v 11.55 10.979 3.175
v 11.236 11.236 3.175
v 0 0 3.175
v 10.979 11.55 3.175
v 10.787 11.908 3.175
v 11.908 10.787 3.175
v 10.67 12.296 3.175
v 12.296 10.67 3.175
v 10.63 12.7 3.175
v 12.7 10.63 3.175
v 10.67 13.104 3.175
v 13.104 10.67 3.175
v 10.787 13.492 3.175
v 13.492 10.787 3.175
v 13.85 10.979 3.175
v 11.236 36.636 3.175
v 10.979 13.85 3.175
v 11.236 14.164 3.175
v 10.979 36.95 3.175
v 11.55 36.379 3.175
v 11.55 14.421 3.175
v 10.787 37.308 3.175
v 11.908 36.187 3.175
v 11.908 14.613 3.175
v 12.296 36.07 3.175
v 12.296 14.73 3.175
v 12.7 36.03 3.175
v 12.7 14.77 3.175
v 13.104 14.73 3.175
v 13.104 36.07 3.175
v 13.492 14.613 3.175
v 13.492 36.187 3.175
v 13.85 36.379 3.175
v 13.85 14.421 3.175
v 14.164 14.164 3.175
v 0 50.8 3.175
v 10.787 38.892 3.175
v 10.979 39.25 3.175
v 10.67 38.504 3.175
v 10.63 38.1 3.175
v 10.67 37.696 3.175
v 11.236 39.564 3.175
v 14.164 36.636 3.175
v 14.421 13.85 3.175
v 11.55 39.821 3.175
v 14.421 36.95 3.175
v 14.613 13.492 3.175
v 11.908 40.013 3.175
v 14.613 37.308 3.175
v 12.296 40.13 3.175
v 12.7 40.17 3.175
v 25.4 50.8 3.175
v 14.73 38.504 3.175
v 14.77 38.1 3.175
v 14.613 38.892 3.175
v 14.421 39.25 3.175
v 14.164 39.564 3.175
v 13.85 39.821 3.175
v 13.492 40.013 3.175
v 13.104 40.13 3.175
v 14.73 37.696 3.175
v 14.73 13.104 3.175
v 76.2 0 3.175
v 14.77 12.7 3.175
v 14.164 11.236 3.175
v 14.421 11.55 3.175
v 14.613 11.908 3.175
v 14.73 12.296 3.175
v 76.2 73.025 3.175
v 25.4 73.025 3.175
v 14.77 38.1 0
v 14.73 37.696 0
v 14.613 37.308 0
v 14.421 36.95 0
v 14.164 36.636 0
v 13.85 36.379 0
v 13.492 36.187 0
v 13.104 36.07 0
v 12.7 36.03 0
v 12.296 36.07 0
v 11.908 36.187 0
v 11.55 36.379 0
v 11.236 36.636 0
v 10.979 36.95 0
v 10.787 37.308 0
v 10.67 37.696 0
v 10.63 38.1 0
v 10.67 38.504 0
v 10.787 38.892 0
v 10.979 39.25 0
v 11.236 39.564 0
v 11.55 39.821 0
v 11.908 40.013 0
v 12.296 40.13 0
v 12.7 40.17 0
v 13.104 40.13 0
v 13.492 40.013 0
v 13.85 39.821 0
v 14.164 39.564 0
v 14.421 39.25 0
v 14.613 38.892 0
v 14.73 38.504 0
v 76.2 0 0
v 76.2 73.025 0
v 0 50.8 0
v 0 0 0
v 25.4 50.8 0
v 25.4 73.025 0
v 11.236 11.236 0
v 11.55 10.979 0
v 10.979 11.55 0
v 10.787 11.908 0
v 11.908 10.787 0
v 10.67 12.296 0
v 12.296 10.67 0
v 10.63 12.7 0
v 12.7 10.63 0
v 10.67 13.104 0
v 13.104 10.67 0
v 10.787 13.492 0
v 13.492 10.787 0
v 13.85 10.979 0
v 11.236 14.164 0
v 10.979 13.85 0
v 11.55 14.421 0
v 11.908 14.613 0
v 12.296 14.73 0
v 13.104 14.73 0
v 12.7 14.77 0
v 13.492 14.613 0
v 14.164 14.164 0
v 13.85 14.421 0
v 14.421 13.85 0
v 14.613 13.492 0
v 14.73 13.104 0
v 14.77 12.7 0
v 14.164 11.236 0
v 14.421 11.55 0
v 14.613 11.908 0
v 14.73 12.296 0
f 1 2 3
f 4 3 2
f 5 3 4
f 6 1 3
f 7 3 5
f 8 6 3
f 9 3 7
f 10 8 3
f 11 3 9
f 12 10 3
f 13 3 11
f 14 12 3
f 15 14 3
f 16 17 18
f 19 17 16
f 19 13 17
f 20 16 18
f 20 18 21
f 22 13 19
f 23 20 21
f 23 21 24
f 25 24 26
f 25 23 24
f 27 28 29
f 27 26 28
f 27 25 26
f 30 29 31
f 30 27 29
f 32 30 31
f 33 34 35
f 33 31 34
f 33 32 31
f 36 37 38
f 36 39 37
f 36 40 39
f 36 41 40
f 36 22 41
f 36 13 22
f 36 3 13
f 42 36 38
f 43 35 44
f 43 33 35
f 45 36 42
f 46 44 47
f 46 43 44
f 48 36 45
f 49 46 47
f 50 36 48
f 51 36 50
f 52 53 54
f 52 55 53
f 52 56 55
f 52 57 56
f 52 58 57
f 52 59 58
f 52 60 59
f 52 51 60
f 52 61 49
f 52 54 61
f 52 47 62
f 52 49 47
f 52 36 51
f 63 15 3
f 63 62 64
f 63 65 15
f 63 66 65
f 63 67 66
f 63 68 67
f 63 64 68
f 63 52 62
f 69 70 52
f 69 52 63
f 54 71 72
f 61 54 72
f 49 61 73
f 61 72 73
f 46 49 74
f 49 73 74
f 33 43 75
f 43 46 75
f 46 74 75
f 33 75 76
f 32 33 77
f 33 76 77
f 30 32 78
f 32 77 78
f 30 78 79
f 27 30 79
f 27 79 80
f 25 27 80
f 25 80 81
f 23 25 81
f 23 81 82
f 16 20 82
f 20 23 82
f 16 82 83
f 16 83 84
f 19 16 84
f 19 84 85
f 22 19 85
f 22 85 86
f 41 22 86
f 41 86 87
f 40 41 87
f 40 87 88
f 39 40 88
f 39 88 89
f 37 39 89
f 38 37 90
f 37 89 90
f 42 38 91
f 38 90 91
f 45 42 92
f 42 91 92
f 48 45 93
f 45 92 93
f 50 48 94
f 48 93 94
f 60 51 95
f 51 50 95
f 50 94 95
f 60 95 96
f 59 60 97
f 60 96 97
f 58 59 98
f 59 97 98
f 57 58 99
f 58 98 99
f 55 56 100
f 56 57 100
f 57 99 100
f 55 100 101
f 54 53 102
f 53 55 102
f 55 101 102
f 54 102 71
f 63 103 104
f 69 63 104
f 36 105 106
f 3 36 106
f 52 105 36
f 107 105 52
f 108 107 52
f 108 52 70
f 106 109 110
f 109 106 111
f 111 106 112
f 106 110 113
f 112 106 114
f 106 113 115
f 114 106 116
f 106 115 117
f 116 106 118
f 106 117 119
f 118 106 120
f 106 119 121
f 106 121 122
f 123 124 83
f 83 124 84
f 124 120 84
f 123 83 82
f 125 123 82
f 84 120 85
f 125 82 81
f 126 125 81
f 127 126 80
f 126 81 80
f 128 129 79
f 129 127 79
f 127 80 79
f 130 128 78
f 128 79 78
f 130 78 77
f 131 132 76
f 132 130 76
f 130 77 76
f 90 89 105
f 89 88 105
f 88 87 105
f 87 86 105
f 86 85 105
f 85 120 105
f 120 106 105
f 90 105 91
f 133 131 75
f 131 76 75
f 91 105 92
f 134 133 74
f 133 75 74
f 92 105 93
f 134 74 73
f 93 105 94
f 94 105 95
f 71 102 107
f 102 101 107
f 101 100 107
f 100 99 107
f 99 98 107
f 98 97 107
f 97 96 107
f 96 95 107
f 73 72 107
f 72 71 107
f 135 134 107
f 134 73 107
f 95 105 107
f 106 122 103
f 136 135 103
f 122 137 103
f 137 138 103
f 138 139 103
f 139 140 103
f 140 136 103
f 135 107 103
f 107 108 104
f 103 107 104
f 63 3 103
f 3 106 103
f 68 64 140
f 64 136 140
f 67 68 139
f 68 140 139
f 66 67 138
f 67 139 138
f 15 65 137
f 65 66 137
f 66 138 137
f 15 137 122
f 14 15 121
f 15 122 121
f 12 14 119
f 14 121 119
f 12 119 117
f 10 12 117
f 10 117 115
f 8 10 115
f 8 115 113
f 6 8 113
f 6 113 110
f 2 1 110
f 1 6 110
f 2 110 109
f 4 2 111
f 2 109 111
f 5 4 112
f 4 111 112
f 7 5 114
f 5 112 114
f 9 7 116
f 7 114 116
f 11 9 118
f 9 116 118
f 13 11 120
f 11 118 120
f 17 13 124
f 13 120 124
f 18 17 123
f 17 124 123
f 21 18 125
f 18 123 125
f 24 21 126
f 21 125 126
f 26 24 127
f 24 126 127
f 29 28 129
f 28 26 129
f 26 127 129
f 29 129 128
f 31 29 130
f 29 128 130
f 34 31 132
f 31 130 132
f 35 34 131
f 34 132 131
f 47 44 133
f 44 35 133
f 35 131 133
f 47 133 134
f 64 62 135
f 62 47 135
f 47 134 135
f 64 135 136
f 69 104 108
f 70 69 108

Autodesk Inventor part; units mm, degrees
ref_plane "YZ Plane" through (0, 0, 0) normal (1, 0, 0) x (0, 1, 0)
ref_plane "XZ Plane" through (0, 0, 0) normal (0, 1, 0) x (-1, 0, 0)
ref_plane "XY Plane" through (0, 0, 0) normal (0, 0, 1) x (1, 0, 0)
sketch "Sketch1" plane through (0, 0, 0) normal (0, 0, 1) x (1, 0, 0)
  line L0 (0, 0) -> (76.2, 0)
  line L1 (76.2, 0) -> (76.2, 73.025)
  line L2 (76.2, 73.025) -> (25.4, 73.025)
  line L3 (0, 50.8) -> (0, 0)
  circle A0 centre (12.7, 38.1) radius 2.0701
  circle A1 centre (12.7, 12.7) radius 2.0701
  line L4 (12.7, 38.1) -> (12.7, 12.7) construction
  line L5 (0, 50.8) -> (25.4, 50.8)
  line L6 (25.4, 50.8) -> (25.4, 73.025)
  dimension "d2" = 4.1402
  dimension "d3" = 4.1402
  dimension "d4" = 12.7
  dimension "d5" = 12.7
  dimension "d6" = 25.4
  dimension "d9" = 25.4
  dimension "d10" = 50.8
  dimension "d11" = 50.8
  dimension "d12" = 73.025
extrude "Extrusion1" add sketch "Sketch1" along normal blind 3.175
properties part number "Polycarbonate Board Circuit Breaker" material "Polycarbonate, Clear"
